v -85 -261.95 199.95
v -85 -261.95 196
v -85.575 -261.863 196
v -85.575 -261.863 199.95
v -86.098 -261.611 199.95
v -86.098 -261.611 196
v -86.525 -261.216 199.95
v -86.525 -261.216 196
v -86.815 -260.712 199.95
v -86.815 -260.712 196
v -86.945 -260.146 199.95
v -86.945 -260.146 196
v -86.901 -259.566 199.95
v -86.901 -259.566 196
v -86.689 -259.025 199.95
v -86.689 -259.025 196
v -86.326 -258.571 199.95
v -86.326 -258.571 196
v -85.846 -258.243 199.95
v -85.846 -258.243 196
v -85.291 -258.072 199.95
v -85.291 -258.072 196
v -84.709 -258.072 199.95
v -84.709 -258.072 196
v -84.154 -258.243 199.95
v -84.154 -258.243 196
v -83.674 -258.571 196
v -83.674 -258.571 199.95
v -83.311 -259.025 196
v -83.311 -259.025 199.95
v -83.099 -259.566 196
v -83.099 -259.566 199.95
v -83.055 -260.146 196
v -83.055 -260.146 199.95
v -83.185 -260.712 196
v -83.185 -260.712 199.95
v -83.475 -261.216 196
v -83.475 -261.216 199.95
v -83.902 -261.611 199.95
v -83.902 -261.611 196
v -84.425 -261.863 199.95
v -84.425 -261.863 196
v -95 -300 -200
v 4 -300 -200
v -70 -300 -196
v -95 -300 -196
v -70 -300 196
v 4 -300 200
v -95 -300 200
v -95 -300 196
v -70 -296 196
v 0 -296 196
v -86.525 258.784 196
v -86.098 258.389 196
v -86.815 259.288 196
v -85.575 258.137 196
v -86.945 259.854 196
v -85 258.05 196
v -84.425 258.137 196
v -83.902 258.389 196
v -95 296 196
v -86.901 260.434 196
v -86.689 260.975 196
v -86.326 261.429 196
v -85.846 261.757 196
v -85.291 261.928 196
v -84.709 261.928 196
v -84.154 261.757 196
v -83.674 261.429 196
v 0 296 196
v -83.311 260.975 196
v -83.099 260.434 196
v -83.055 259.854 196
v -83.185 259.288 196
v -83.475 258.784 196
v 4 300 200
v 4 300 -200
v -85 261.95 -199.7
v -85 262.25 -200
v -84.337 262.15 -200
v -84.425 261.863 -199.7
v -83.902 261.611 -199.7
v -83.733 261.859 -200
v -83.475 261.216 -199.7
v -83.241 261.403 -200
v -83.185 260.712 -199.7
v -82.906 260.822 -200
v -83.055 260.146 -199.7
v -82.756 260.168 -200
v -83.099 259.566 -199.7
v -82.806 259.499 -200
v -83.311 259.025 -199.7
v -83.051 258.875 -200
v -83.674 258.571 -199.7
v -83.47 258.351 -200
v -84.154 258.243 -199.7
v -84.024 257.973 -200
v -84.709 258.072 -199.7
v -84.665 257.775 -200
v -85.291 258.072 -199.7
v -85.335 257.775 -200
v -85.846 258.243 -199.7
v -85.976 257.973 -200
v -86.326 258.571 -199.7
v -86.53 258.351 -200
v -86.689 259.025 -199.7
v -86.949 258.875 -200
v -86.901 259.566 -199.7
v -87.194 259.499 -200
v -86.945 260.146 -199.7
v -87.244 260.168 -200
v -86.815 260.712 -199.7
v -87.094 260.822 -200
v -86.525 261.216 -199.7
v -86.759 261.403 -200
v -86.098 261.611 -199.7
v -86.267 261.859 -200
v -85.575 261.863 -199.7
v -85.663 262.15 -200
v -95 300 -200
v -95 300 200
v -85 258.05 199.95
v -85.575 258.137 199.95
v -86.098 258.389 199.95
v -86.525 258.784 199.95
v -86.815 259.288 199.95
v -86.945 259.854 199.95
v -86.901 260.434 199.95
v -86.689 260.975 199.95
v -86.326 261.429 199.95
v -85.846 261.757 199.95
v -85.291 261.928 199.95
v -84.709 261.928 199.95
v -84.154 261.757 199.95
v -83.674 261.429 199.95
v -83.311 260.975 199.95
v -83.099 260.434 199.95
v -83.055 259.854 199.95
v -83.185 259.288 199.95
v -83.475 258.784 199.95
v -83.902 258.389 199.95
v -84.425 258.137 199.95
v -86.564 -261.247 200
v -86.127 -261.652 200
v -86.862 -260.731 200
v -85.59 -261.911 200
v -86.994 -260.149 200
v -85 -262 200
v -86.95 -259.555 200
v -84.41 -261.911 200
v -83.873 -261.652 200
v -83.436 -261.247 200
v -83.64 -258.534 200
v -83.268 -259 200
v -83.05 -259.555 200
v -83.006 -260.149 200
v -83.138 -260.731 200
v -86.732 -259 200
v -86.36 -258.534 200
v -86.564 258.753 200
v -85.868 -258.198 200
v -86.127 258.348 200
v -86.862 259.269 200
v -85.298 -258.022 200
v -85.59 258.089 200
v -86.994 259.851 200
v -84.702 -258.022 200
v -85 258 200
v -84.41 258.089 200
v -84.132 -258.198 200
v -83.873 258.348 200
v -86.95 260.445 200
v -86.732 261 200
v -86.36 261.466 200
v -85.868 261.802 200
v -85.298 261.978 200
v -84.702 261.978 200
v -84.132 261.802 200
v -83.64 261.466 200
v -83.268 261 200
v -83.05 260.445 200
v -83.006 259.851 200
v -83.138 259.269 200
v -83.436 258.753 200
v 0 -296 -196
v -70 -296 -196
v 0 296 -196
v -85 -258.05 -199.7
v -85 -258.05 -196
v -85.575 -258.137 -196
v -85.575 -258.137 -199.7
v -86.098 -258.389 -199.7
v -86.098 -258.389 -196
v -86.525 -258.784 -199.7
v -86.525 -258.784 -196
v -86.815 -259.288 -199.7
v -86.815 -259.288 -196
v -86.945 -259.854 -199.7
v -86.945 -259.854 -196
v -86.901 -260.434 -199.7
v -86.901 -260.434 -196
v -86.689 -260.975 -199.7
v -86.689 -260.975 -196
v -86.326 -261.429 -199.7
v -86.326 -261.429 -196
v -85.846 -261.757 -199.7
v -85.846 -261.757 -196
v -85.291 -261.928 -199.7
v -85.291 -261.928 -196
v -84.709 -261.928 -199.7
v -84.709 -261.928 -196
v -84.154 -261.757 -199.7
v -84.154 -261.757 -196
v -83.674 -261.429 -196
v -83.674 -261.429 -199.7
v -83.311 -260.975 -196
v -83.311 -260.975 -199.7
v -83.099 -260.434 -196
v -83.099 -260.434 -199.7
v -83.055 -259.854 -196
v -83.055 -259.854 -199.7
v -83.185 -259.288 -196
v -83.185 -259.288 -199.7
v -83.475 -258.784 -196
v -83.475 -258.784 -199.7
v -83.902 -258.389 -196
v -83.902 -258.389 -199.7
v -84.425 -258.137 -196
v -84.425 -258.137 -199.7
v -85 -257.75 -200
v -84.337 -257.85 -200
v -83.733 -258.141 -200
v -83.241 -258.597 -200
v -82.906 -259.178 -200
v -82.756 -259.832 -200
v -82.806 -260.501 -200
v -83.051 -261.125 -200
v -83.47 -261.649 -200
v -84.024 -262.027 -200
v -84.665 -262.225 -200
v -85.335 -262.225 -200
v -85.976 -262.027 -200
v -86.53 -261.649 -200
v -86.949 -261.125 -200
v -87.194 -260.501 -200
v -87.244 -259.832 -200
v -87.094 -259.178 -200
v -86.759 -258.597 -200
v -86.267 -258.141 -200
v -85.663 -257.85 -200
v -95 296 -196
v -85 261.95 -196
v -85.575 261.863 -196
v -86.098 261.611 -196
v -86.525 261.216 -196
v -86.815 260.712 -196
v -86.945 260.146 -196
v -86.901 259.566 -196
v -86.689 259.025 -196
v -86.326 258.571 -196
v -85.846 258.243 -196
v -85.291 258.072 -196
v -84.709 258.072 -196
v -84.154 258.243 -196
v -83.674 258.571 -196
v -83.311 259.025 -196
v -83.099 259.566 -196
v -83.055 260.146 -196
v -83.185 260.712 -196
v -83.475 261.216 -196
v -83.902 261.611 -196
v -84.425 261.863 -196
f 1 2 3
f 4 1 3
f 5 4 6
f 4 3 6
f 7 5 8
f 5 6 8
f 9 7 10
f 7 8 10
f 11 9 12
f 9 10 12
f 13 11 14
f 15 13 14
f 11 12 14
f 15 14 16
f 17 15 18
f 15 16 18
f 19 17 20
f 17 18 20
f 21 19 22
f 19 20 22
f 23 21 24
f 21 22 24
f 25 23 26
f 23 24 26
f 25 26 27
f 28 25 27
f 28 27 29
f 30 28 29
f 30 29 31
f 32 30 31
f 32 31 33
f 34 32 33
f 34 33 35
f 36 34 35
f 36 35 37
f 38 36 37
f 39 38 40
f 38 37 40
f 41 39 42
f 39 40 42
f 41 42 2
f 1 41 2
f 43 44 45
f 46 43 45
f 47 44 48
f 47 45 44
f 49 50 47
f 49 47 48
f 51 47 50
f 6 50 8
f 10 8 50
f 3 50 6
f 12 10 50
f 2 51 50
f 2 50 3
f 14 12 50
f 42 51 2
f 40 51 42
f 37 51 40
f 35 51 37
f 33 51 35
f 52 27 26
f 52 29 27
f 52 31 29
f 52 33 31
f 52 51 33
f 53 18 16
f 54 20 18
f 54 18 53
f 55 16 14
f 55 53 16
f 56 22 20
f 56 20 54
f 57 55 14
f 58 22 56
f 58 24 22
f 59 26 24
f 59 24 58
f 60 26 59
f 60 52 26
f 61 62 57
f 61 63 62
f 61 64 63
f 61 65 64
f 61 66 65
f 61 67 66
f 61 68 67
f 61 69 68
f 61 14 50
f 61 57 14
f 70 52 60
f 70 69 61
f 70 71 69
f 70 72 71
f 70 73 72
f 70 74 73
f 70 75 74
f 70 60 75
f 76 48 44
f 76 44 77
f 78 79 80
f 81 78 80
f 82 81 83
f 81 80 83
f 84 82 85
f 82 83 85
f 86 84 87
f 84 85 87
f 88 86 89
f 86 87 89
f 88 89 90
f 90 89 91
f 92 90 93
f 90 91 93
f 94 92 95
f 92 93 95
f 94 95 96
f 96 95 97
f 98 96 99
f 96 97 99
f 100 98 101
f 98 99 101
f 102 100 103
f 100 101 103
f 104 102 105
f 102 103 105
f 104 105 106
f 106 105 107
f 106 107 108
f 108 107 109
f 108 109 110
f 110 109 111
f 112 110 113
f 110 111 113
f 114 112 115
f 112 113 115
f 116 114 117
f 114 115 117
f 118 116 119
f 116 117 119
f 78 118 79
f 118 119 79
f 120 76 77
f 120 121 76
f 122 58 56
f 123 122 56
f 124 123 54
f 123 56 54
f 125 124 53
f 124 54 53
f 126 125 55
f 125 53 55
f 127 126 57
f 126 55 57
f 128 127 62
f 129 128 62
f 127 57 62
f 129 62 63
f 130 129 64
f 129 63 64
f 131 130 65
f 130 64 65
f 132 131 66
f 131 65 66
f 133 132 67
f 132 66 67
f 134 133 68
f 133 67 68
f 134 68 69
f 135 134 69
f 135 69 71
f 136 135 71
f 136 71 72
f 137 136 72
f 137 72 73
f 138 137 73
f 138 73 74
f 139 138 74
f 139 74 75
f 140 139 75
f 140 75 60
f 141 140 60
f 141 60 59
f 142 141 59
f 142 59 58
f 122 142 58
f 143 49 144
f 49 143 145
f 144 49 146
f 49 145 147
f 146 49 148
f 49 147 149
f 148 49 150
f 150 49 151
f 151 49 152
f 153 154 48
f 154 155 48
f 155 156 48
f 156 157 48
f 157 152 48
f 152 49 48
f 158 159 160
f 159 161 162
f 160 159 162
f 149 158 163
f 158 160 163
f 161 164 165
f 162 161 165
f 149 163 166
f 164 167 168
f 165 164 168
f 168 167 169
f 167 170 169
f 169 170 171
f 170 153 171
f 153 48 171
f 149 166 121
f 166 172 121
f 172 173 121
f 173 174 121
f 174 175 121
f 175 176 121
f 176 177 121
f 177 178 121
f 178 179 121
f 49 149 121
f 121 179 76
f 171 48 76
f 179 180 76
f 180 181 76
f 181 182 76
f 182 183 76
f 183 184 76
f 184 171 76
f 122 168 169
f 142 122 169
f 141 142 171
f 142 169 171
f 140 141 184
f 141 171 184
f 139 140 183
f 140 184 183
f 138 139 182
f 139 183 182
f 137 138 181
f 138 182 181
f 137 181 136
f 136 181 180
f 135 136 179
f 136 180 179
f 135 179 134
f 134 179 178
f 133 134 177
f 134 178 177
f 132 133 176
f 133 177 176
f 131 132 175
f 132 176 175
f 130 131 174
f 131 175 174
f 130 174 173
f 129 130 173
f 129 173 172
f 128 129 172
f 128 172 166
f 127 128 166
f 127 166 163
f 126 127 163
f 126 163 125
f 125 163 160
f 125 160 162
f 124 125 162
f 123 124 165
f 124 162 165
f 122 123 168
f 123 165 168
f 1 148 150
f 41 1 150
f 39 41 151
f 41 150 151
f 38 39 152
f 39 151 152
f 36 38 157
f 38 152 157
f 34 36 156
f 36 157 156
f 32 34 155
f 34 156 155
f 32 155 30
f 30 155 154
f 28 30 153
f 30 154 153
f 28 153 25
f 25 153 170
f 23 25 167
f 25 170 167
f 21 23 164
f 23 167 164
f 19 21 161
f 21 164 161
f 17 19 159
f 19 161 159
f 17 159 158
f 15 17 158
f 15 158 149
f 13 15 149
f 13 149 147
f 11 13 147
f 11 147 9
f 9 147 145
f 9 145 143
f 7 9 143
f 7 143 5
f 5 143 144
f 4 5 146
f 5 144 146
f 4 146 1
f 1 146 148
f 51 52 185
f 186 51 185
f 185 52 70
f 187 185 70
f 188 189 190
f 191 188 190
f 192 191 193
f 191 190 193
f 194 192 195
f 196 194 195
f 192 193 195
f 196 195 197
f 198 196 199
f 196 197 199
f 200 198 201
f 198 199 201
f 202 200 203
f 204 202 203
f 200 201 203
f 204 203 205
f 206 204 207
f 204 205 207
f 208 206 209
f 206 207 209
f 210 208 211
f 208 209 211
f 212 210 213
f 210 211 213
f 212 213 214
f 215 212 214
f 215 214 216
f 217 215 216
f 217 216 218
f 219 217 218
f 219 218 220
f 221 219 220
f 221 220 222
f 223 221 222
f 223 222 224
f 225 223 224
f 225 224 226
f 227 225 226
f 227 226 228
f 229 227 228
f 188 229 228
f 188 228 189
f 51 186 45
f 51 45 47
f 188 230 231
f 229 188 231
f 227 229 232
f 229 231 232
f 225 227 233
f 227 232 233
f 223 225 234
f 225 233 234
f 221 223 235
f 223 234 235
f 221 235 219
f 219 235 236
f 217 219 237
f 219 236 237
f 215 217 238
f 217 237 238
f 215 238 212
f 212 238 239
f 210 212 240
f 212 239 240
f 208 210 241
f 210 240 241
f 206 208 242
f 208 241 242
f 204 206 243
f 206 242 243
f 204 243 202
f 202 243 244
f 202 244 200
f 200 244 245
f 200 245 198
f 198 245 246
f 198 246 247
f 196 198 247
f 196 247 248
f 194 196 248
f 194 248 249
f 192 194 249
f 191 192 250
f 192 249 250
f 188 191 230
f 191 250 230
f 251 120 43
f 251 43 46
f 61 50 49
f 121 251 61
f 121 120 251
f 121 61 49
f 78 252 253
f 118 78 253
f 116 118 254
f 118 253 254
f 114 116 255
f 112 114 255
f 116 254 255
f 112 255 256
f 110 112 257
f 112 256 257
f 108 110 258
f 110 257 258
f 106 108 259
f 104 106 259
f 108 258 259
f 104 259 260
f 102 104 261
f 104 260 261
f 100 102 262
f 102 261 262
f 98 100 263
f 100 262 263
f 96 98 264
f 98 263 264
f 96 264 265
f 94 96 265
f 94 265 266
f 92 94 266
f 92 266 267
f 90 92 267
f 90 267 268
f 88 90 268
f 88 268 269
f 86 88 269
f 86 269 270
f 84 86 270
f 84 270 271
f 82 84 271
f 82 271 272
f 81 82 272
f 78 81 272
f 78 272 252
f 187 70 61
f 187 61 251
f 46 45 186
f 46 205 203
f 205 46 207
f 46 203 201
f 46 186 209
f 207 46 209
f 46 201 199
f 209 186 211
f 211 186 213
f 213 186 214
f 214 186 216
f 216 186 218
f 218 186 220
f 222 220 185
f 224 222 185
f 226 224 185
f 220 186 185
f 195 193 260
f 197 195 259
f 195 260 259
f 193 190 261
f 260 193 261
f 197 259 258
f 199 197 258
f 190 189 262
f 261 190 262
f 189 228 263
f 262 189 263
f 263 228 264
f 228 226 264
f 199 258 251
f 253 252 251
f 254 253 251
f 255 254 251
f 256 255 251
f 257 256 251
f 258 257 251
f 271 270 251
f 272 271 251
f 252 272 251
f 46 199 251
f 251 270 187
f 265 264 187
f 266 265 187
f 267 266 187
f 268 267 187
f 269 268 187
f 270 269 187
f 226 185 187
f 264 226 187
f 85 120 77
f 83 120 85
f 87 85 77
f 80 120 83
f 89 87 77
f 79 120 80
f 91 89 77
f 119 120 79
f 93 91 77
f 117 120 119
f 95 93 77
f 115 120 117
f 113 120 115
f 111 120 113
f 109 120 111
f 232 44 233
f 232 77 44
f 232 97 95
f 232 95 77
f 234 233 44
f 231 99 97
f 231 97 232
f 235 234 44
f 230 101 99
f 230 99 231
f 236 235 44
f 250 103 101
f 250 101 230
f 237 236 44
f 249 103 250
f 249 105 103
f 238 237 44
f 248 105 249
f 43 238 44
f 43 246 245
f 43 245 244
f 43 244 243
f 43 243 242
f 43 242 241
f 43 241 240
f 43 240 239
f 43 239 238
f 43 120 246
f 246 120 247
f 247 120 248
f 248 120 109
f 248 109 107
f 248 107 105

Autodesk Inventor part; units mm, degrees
ref_plane "YZ Plane" through (0, 0, 0) normal (1, 0, 0) x (0, 1, 0)
ref_plane "XZ Plane" through (0, 0, 0) normal (0, 1, 0) x (-1, 0, 0)
ref_plane "XY Plane" through (0, 0, 0) normal (0, 0, 1) x (1, 0, 0)
sketch "Эскиз1" plane through (0, 0, 0) normal (1, 0, 0) x (0, 1, 0)
  line L0 (-300, 200) -> (300, 200)
  line L1 (300, 200) -> (300, -200)
  line L2 (300, -200) -> (-300, -200)
  line L3 (-300, -200) -> (-300, 200)
  line L4 (-300, 200) -> (300, -200) construction
  line L5 (300, 200) -> (-300, -200) construction
  point P0 (0, 0)
  dimension "d0" = 400
  dimension "d1" = 600
extrude "Выдавливание1" add sketch "Эскиз1" along normal blind 4
sketch "Эскиз2" plane through (0, 0, 0) normal (-1, 0, 0) x (0, 0, 1)
  line L0 (-200, -300) -> (-200, 300) projected
  line L1 (-200, 300) -> (200, 300) projected
  line L2 (-200, -300) -> (-196, -300)
  line L3 (-196, -300) -> (-196, 300)
  line L4 (-196, 300) -> (-200, 300)
  line L5 (-200, 300) -> (-200, -300)
  line L6 (200, 300) -> (200, -300) projected
  line L7 (-200, 300) -> (200, 300)
  line L8 (200, 300) -> (200, 296)
  line L9 (200, 296) -> (-200, 296)
  line L10 (-200, 296) -> (-200, 300)
  line L11 (200, -300) -> (196, -300)
  line L12 (196, -300) -> (196, 300)
  line L13 (196, 300) -> (200, 300)
  line L14 (200, 300) -> (200, -300)
  point P0 (0, 0)
  point P1 (-196, 296)
  point P2 (196, 296)
  dimension "d4" = 4
  dimension "d5" = 4
  dimension "d6" = 4
extrude "Выдавливание2" add sketch "Эскиз2" along normal blind 95
sketch "Эскиз3" plane through (0, 0, 0) normal (-1, 0, 0) x (0, 0, 1)
  line L0 (-200, 300) -> (-200, -300) projected
  line L1 (200, -300) -> (200, 300) projected
  line L2 (-200, -300) -> (200, -300)
  line L3 (200, -300) -> (200, -296)
  line L4 (200, -296) -> (-200, -296)
  line L5 (-200, -296) -> (-200, -300)
  point P0 (0, 0)
  point P1 (-200, -296)
  dimension "d10" = 4
extrude "Выдавливание3" add sketch "Эскиз3" along normal blind 70
sketch "Эскиз4" plane through (4, -300, -200) normal (0, 0, -1) x (-1, 0, 0)
  line L0 (4, 300) -> (99, 300) construction
  line L1 (99, 0) -> (99, 600) projected
  line L2 (0, 0) -> (99, 0) projected
  point P0 (89, 560)
  point P1 (89, 40)
  dimension "d13" = 10
  dimension "d14" = 40
hole "Отверстие1" at (-85, 260, -200) at (-85, -260, -200) direction (0, 0, 1) diameter 3.9 depth 6 countersink diameter 4.5 countersink angle 90
sketch "Эскиз5" plane through (4, -300, 200) normal (0, 0, 1) x (1, 0, 0)
  circle A0 centre (-89, 560) radius 2.25 projected
  circle A1 centre (-89, 40) radius 2.25 projected
  point P0 (-4, 300)
hole "Отверстие2" at (-85, 260, 200) at (-85, -260, 200) direction (0, 0, -1) diameter 3.9 depth 6 countersink diameter 4 countersink angle 90
equation "\"d5\" = d4"
equation "\"d6\" = d4"
properties part number "Стеклянная крышка"
